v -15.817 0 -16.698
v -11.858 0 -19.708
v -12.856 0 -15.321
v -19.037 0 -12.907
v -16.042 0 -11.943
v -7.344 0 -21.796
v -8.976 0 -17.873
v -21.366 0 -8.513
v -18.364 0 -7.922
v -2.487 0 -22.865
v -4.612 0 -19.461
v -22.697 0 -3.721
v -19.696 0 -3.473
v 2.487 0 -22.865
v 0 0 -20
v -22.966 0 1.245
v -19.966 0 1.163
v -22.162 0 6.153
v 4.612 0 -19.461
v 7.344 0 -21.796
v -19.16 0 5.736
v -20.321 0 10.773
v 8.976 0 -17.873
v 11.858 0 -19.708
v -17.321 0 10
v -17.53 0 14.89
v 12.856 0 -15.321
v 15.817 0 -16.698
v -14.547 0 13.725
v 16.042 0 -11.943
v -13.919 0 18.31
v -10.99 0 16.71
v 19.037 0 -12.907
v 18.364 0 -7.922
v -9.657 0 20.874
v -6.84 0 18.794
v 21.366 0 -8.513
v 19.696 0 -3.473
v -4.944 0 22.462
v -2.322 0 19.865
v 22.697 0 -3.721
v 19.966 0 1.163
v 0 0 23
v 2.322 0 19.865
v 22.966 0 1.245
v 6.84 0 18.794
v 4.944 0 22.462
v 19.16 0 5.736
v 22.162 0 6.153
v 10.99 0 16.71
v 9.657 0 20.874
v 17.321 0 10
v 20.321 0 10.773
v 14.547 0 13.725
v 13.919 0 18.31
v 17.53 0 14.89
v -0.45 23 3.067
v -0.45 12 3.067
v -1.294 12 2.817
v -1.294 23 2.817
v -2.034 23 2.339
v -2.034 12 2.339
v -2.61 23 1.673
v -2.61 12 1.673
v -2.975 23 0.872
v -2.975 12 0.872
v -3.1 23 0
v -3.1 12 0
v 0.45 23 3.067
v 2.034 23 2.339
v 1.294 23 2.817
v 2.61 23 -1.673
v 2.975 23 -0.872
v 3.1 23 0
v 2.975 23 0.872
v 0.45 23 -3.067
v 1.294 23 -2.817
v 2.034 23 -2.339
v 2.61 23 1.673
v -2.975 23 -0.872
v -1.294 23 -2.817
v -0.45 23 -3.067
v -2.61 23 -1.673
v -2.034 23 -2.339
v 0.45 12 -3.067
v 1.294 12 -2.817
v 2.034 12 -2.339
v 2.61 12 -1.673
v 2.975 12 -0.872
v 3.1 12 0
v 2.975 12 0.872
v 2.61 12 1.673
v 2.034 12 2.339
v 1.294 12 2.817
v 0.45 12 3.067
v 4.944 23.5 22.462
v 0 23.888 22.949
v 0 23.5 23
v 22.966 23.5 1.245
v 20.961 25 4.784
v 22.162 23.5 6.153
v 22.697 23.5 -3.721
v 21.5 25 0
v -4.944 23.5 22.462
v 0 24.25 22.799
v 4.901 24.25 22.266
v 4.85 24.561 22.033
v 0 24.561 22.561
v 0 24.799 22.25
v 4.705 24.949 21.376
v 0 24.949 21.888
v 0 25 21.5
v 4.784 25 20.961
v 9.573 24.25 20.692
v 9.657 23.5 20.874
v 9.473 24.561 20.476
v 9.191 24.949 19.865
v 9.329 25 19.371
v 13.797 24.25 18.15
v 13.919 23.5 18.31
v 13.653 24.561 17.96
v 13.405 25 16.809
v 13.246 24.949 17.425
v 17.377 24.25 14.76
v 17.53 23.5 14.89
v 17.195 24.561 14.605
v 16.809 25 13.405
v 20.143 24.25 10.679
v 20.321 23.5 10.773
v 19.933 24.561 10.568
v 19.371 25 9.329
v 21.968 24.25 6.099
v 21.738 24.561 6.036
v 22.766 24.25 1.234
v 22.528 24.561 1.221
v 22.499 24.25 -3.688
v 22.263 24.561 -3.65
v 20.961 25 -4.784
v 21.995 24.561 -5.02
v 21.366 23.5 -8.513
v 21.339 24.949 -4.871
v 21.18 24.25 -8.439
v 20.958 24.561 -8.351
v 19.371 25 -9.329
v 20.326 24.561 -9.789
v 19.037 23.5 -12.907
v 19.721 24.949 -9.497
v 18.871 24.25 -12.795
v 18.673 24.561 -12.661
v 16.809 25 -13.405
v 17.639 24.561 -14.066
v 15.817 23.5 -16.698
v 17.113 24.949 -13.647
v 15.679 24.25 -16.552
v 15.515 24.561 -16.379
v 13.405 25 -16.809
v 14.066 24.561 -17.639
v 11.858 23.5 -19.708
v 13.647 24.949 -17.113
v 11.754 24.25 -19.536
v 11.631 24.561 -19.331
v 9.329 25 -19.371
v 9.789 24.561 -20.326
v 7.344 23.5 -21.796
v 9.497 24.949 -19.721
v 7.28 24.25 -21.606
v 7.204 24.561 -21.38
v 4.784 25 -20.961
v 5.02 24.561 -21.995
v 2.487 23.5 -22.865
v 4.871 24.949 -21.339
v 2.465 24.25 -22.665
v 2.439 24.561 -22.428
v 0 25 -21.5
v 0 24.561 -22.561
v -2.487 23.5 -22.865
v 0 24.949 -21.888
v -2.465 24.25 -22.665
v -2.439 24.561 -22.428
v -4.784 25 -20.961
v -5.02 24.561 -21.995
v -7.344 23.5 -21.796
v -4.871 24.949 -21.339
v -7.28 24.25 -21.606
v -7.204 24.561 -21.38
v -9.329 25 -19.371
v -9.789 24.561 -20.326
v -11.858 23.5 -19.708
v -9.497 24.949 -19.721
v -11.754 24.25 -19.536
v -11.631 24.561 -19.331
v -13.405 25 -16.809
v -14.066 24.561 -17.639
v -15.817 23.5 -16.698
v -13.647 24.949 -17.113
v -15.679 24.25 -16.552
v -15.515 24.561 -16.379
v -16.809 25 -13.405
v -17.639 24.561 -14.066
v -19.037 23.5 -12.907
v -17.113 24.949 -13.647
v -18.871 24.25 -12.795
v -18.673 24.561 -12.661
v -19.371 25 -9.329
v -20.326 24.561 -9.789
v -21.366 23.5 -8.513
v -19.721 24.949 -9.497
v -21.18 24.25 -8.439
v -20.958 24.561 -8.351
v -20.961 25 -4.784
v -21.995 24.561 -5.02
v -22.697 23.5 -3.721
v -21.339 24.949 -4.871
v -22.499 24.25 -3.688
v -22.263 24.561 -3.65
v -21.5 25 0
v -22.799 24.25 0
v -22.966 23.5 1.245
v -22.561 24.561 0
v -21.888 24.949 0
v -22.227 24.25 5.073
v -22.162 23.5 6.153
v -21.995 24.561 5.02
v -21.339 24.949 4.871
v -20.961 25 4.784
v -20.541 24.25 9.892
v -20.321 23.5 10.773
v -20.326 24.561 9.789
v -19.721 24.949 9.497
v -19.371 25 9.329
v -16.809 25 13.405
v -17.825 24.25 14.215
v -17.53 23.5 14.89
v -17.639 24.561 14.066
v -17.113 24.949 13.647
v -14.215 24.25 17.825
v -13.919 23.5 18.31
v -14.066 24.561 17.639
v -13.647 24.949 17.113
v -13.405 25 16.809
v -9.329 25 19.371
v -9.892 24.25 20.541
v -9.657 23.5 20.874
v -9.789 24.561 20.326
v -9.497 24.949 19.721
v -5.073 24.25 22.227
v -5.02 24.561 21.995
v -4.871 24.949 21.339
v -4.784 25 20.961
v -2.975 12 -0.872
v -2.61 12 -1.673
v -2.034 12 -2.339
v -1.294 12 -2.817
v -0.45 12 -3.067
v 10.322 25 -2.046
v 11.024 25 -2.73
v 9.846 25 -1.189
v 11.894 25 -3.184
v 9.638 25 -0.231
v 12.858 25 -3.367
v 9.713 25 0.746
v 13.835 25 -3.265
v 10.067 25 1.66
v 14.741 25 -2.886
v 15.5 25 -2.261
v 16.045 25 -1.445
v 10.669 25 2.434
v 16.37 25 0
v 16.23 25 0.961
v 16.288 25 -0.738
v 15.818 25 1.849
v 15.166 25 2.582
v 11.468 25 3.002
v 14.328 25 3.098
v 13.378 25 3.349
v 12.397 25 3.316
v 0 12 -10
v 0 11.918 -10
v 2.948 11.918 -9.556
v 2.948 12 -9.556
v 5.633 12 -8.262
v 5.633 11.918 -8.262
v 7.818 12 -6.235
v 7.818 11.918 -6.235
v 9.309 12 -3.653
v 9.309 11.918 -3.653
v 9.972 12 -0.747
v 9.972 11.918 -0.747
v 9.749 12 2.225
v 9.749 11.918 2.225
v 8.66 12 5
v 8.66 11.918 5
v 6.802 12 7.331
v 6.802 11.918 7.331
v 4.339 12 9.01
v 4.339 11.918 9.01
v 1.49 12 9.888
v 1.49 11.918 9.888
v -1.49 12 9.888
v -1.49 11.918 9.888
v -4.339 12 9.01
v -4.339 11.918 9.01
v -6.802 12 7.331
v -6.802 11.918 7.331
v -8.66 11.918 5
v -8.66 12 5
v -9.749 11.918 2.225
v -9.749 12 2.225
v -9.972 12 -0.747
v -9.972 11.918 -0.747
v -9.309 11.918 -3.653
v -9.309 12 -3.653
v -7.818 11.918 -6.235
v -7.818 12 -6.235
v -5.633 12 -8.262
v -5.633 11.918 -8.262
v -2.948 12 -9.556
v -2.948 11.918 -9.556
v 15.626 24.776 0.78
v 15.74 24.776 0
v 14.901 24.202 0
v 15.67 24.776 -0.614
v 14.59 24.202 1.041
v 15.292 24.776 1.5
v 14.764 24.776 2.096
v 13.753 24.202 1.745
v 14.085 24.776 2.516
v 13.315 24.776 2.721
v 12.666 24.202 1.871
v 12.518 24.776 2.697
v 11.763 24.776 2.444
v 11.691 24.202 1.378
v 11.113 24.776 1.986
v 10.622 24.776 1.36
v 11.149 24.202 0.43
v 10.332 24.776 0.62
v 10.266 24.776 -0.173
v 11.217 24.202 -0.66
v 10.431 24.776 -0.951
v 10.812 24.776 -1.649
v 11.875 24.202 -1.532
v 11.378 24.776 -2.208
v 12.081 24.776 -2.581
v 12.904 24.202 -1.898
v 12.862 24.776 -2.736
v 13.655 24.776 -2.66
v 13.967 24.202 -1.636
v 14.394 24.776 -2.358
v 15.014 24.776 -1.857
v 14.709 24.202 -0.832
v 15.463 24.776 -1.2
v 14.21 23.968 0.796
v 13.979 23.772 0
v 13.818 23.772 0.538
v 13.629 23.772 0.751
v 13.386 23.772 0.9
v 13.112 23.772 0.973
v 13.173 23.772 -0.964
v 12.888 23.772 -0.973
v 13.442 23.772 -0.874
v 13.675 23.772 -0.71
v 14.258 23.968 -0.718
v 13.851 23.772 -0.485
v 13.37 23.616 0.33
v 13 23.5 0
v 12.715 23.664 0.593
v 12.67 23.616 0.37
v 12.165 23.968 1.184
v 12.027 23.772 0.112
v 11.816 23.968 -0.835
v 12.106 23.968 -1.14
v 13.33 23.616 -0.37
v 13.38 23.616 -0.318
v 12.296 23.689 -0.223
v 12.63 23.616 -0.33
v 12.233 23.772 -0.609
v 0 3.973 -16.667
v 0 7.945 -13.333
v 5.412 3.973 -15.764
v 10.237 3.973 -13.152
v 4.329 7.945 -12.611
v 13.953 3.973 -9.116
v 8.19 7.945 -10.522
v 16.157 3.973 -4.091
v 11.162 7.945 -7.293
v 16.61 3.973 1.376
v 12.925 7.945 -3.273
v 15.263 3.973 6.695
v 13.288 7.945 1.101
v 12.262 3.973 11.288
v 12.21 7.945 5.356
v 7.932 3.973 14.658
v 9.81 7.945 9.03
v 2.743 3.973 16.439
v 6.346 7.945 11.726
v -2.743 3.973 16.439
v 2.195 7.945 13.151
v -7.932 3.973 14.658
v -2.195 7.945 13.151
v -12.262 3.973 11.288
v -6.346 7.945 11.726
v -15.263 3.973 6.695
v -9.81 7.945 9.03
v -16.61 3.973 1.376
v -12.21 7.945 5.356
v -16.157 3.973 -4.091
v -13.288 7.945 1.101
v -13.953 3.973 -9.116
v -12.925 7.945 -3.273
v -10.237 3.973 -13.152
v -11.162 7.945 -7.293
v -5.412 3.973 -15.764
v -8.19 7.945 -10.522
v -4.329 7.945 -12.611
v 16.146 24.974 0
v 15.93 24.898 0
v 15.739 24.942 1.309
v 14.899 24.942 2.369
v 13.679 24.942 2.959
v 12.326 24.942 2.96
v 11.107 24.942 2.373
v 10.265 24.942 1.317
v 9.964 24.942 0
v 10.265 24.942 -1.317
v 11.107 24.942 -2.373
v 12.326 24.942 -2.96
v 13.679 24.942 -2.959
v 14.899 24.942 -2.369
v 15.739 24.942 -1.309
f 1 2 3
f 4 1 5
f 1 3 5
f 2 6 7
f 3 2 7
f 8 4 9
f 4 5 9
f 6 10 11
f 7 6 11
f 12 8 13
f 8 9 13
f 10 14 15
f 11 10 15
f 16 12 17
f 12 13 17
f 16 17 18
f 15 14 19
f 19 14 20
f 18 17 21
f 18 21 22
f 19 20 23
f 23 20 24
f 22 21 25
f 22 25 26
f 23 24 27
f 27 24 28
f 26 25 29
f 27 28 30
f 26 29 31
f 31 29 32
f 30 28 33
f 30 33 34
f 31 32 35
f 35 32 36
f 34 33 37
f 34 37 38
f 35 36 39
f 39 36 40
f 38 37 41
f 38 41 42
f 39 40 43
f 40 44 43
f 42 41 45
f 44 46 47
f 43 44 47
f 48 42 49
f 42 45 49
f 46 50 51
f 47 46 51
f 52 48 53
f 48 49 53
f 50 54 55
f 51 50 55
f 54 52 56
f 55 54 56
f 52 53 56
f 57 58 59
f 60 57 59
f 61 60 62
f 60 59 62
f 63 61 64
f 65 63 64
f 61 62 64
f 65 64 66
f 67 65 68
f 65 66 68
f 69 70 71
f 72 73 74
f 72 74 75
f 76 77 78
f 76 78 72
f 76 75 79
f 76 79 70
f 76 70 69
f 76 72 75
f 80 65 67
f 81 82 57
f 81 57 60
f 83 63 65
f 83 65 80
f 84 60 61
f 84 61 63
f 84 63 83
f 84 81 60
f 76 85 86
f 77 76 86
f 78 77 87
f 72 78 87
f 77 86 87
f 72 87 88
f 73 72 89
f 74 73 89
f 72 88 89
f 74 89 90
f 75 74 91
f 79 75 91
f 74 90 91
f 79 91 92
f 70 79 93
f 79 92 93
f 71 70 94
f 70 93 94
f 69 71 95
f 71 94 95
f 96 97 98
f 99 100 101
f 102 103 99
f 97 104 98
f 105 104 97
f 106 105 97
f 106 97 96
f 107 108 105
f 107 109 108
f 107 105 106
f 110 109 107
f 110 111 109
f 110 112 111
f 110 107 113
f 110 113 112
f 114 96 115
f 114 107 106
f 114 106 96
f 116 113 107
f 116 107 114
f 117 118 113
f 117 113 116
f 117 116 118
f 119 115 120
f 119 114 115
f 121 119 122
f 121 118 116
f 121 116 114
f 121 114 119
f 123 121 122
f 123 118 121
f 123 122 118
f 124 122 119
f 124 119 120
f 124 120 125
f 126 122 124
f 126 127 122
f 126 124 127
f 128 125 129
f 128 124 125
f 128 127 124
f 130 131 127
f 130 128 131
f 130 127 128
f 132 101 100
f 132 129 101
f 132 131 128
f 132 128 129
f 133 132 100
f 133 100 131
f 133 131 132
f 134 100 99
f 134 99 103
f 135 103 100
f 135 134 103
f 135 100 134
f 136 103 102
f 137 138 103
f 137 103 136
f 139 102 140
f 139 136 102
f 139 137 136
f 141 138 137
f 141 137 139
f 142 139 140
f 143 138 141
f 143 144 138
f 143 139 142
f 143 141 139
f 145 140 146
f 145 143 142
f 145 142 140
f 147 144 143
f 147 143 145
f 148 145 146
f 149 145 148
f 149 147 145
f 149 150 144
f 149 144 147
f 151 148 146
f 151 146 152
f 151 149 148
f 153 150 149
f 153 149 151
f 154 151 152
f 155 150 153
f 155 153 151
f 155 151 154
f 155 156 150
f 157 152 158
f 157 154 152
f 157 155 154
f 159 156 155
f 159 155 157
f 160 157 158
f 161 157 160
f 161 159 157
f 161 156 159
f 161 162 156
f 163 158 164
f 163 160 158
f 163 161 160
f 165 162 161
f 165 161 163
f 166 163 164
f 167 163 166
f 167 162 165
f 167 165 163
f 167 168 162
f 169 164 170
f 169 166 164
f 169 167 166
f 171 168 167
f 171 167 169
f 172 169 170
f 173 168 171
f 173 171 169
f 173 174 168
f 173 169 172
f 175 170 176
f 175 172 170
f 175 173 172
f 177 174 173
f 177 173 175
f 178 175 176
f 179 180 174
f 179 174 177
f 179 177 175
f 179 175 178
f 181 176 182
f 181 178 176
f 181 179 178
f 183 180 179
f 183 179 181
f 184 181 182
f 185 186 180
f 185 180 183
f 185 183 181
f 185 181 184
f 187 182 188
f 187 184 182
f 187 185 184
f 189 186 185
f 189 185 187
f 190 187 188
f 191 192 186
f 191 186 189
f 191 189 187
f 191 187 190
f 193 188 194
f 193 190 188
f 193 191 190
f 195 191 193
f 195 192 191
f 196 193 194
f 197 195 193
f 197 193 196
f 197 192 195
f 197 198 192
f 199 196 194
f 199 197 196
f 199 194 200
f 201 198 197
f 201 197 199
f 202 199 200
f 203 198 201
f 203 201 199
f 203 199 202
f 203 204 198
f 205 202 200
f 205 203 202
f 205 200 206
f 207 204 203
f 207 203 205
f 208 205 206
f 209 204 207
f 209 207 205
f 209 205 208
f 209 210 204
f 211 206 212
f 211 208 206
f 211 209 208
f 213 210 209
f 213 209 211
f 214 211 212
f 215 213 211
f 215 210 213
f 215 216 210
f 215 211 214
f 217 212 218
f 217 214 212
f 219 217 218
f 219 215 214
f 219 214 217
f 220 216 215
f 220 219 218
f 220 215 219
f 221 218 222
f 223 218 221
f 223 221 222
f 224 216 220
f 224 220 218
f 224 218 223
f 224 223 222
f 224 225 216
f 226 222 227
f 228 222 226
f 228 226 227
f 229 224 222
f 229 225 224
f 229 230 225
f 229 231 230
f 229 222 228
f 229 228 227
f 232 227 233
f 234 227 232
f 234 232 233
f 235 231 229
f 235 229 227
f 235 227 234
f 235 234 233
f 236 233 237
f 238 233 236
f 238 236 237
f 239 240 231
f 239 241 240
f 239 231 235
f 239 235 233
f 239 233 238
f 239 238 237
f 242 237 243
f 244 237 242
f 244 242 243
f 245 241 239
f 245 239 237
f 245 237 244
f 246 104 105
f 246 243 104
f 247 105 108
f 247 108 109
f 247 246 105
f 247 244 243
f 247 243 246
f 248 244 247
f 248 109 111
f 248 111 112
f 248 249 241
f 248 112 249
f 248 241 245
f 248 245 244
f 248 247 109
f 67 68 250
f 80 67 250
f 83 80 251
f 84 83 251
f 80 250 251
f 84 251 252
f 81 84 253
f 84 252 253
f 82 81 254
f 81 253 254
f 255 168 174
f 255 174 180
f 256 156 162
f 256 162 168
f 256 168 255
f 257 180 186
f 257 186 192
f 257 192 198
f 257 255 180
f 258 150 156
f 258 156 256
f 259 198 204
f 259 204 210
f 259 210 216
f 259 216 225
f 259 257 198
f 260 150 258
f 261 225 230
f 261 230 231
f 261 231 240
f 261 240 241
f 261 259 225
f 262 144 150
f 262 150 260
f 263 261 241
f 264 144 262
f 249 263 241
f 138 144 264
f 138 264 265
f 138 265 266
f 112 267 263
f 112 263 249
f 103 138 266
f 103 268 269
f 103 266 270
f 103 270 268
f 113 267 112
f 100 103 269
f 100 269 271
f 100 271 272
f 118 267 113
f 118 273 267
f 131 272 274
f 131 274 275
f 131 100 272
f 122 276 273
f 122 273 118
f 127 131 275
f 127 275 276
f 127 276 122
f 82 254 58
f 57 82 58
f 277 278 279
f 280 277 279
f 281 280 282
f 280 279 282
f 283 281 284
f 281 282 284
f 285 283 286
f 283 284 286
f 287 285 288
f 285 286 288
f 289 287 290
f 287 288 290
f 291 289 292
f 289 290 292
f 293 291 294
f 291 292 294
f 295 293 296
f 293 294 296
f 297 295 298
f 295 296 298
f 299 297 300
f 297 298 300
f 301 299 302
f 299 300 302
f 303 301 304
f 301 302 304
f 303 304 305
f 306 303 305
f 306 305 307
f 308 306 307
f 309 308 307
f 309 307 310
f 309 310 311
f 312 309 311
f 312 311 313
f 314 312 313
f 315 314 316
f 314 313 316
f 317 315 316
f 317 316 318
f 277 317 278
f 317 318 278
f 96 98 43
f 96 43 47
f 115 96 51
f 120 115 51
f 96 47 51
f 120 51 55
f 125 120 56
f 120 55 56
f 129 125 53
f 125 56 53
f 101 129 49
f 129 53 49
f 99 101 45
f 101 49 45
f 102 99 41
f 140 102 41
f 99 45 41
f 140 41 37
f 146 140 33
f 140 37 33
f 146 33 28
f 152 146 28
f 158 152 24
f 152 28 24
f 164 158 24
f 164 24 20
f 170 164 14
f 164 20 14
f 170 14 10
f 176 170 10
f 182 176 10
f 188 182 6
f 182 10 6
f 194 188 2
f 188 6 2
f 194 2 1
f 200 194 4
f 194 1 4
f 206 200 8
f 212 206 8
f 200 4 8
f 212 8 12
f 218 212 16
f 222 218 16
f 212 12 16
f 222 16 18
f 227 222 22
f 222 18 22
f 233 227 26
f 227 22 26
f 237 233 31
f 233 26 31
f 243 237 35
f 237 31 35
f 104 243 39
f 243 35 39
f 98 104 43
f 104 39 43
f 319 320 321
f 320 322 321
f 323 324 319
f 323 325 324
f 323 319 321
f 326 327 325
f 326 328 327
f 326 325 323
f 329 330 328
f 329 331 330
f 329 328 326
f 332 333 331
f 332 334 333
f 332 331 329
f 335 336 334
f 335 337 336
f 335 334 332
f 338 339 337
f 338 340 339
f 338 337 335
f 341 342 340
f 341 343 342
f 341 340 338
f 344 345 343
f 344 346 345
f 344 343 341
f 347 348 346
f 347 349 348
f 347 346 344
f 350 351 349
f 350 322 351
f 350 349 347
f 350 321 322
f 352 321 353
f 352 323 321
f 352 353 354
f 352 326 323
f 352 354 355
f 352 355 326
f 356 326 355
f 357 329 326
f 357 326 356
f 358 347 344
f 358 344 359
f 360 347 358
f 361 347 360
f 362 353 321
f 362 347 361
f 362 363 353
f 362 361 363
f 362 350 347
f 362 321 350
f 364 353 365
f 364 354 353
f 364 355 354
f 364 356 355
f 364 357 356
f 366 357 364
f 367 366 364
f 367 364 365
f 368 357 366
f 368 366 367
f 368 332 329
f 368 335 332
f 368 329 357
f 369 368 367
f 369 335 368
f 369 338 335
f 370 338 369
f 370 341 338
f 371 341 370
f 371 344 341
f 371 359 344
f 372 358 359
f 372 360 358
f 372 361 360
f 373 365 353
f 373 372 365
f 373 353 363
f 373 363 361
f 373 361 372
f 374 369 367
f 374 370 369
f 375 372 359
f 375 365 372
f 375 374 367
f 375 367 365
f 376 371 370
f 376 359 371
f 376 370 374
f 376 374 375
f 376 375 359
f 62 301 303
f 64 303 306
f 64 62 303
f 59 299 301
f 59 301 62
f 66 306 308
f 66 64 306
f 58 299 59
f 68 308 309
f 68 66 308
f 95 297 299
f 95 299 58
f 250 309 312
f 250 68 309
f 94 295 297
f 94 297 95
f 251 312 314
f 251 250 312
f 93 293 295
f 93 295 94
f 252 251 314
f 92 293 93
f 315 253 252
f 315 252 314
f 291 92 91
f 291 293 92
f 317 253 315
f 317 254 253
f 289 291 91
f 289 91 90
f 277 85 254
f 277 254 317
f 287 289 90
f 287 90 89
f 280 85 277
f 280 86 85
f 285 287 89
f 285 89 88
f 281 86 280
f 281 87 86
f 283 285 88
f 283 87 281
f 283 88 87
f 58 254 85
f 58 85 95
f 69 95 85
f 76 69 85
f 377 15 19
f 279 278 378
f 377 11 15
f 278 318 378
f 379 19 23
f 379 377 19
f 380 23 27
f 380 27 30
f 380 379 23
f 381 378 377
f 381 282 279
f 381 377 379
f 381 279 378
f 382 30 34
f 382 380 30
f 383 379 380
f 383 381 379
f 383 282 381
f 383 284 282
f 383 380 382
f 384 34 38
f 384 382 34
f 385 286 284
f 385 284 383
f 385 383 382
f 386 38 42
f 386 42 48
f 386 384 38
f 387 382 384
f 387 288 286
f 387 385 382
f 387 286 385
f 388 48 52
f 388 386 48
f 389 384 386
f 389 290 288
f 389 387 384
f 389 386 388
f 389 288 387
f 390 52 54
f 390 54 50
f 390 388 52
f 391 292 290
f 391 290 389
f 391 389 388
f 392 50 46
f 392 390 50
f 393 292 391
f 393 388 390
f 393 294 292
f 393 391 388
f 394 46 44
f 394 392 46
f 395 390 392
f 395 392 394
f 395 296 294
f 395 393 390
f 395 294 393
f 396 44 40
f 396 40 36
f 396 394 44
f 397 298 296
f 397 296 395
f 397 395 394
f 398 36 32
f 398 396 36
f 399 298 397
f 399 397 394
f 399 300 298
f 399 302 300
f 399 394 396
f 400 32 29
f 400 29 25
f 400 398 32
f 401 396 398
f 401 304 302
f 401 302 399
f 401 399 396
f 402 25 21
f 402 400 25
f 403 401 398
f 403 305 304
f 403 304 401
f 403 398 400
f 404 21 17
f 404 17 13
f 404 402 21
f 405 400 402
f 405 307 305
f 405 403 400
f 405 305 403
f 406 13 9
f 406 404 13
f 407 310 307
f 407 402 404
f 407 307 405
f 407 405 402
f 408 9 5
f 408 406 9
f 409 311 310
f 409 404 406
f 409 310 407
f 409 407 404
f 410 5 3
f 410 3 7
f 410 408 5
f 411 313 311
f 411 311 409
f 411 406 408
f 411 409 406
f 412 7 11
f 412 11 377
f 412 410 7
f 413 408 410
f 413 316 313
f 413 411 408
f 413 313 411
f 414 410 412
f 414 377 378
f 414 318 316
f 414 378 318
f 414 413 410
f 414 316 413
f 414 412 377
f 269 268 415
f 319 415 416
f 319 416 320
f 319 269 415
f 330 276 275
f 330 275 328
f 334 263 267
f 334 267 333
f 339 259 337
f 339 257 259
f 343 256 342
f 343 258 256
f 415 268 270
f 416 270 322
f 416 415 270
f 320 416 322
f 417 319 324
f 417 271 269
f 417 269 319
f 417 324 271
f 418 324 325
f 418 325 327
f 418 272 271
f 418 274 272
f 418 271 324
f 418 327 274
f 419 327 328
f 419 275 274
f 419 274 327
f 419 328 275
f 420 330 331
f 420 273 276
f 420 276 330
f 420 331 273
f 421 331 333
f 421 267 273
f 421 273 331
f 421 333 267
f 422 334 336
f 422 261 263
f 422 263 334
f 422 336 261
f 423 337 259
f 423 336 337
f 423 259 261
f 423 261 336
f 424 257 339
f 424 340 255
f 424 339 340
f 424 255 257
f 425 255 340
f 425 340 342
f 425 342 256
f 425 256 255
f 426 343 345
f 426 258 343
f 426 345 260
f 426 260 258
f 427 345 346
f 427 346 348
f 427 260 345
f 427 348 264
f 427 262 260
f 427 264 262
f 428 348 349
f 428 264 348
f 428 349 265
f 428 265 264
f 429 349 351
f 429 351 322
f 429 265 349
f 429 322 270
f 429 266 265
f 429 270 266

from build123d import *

# Parameters (mm, degrees)
SKETCH1_R           = 23
BOSS_EXTRUDE1_DEPTH = 25
CUT_EXTRUDE1_DEPTH  = 23
SKETCH4_R           = 10
CUT_EXTRUDE2_DEPTH  = 12
CHAMFER1_SIZE       = 10
CHAMFER1_SIZE2      = 11.917535926
FILLET1_R           = 1.5
FILLET2_R           = 1


with BuildPart() as part:
    # Sketch1 → Boss-Extrude1 (new body)
    with BuildSketch(Plane(origin=(0, 0, 0), x_dir=(1, 0, 0), z_dir=(0, 1, 0))):
        with Locations(Location((0, 0, 0), (0, 0, 270))):
            Circle(SKETCH1_R)
    extrude(amount=BOSS_EXTRUDE1_DEPTH)

    # Sketch3 → Cut-Extrude1 (cut)
    with BuildSketch(Plane(origin=(0, 0, 0), x_dir=(-1, 0, 0), z_dir=(0, -1, 0))):
        with BuildLine():
            Line((-0.45, -3.067164815), (-0.45, 3.067164815))
            ThreePointArc((-0.45, 3.067164815), (-3.1, 0), (-0.45, -3.067164815))
        make_face()
        with BuildLine():
            ThreePointArc((3.1, 0), (2.345740821, 2.02669682), (0.45, 3.067164815))
            Line((0.45, 3.067164815), (0.45, -3.067164815))
            ThreePointArc((0.45, -3.067164815), (2.345740821, -2.02669682), (3.1, 0))
        make_face()
    extrude(amount=-CUT_EXTRUDE1_DEPTH, mode=Mode.SUBTRACT)

    # Sketch4 → Cut-Extrude2 (cut)
    with BuildSketch(Plane(origin=(0, 0, 0), x_dir=(-1, 0, 0), z_dir=(0, -1, 0))):
        with Locations(Location((0, 0, 0), (0, 0, 90))):
            Circle(SKETCH4_R)
    extrude(amount=-CUT_EXTRUDE2_DEPTH, mode=Mode.SUBTRACT)

    # Chamfer1
    chamfer1_edges = [part.edges().sort_by_distance(p)[0] for p in [
        (0, 0, 10),
    ]]
    chamfer1_side = [part.faces().sort_by_distance(p)[0] for p in [
        (0, 0, -22.349461761),
    ]]
    chamfer(chamfer1_edges, length=CHAMFER1_SIZE, length2=CHAMFER1_SIZE2, reference=chamfer1_side[0])

    # Fillet1
    fillet1_edges = [part.edges().sort_by_distance(p)[0] for p in [
        (0, 25, -23),
    ]]
    fillet(fillet1_edges, radius=FILLET1_R)

    # Sketch5 → Cut-Revolve1 (revolve, cut)
    with BuildSketch(Plane.XY):
        with BuildLine():
            Line((13, 25), (13, 23.5))
            ThreePointArc((13, 23.5), (14.60360392, 24.042792159), (16, 25))
            Line((16, 25), (13, 25))
        make_face()
    revolve(axis=Axis((13, 25, 0), (0, -1, 0)), mode=Mode.SUBTRACT)

    # Fillet2
    fillet2_edges = [part.edges().sort_by_distance(p)[0] for p in [
        (10, 25, 0),
    ]]
    fillet(fillet2_edges, radius=FILLET2_R)


solid = part.part
